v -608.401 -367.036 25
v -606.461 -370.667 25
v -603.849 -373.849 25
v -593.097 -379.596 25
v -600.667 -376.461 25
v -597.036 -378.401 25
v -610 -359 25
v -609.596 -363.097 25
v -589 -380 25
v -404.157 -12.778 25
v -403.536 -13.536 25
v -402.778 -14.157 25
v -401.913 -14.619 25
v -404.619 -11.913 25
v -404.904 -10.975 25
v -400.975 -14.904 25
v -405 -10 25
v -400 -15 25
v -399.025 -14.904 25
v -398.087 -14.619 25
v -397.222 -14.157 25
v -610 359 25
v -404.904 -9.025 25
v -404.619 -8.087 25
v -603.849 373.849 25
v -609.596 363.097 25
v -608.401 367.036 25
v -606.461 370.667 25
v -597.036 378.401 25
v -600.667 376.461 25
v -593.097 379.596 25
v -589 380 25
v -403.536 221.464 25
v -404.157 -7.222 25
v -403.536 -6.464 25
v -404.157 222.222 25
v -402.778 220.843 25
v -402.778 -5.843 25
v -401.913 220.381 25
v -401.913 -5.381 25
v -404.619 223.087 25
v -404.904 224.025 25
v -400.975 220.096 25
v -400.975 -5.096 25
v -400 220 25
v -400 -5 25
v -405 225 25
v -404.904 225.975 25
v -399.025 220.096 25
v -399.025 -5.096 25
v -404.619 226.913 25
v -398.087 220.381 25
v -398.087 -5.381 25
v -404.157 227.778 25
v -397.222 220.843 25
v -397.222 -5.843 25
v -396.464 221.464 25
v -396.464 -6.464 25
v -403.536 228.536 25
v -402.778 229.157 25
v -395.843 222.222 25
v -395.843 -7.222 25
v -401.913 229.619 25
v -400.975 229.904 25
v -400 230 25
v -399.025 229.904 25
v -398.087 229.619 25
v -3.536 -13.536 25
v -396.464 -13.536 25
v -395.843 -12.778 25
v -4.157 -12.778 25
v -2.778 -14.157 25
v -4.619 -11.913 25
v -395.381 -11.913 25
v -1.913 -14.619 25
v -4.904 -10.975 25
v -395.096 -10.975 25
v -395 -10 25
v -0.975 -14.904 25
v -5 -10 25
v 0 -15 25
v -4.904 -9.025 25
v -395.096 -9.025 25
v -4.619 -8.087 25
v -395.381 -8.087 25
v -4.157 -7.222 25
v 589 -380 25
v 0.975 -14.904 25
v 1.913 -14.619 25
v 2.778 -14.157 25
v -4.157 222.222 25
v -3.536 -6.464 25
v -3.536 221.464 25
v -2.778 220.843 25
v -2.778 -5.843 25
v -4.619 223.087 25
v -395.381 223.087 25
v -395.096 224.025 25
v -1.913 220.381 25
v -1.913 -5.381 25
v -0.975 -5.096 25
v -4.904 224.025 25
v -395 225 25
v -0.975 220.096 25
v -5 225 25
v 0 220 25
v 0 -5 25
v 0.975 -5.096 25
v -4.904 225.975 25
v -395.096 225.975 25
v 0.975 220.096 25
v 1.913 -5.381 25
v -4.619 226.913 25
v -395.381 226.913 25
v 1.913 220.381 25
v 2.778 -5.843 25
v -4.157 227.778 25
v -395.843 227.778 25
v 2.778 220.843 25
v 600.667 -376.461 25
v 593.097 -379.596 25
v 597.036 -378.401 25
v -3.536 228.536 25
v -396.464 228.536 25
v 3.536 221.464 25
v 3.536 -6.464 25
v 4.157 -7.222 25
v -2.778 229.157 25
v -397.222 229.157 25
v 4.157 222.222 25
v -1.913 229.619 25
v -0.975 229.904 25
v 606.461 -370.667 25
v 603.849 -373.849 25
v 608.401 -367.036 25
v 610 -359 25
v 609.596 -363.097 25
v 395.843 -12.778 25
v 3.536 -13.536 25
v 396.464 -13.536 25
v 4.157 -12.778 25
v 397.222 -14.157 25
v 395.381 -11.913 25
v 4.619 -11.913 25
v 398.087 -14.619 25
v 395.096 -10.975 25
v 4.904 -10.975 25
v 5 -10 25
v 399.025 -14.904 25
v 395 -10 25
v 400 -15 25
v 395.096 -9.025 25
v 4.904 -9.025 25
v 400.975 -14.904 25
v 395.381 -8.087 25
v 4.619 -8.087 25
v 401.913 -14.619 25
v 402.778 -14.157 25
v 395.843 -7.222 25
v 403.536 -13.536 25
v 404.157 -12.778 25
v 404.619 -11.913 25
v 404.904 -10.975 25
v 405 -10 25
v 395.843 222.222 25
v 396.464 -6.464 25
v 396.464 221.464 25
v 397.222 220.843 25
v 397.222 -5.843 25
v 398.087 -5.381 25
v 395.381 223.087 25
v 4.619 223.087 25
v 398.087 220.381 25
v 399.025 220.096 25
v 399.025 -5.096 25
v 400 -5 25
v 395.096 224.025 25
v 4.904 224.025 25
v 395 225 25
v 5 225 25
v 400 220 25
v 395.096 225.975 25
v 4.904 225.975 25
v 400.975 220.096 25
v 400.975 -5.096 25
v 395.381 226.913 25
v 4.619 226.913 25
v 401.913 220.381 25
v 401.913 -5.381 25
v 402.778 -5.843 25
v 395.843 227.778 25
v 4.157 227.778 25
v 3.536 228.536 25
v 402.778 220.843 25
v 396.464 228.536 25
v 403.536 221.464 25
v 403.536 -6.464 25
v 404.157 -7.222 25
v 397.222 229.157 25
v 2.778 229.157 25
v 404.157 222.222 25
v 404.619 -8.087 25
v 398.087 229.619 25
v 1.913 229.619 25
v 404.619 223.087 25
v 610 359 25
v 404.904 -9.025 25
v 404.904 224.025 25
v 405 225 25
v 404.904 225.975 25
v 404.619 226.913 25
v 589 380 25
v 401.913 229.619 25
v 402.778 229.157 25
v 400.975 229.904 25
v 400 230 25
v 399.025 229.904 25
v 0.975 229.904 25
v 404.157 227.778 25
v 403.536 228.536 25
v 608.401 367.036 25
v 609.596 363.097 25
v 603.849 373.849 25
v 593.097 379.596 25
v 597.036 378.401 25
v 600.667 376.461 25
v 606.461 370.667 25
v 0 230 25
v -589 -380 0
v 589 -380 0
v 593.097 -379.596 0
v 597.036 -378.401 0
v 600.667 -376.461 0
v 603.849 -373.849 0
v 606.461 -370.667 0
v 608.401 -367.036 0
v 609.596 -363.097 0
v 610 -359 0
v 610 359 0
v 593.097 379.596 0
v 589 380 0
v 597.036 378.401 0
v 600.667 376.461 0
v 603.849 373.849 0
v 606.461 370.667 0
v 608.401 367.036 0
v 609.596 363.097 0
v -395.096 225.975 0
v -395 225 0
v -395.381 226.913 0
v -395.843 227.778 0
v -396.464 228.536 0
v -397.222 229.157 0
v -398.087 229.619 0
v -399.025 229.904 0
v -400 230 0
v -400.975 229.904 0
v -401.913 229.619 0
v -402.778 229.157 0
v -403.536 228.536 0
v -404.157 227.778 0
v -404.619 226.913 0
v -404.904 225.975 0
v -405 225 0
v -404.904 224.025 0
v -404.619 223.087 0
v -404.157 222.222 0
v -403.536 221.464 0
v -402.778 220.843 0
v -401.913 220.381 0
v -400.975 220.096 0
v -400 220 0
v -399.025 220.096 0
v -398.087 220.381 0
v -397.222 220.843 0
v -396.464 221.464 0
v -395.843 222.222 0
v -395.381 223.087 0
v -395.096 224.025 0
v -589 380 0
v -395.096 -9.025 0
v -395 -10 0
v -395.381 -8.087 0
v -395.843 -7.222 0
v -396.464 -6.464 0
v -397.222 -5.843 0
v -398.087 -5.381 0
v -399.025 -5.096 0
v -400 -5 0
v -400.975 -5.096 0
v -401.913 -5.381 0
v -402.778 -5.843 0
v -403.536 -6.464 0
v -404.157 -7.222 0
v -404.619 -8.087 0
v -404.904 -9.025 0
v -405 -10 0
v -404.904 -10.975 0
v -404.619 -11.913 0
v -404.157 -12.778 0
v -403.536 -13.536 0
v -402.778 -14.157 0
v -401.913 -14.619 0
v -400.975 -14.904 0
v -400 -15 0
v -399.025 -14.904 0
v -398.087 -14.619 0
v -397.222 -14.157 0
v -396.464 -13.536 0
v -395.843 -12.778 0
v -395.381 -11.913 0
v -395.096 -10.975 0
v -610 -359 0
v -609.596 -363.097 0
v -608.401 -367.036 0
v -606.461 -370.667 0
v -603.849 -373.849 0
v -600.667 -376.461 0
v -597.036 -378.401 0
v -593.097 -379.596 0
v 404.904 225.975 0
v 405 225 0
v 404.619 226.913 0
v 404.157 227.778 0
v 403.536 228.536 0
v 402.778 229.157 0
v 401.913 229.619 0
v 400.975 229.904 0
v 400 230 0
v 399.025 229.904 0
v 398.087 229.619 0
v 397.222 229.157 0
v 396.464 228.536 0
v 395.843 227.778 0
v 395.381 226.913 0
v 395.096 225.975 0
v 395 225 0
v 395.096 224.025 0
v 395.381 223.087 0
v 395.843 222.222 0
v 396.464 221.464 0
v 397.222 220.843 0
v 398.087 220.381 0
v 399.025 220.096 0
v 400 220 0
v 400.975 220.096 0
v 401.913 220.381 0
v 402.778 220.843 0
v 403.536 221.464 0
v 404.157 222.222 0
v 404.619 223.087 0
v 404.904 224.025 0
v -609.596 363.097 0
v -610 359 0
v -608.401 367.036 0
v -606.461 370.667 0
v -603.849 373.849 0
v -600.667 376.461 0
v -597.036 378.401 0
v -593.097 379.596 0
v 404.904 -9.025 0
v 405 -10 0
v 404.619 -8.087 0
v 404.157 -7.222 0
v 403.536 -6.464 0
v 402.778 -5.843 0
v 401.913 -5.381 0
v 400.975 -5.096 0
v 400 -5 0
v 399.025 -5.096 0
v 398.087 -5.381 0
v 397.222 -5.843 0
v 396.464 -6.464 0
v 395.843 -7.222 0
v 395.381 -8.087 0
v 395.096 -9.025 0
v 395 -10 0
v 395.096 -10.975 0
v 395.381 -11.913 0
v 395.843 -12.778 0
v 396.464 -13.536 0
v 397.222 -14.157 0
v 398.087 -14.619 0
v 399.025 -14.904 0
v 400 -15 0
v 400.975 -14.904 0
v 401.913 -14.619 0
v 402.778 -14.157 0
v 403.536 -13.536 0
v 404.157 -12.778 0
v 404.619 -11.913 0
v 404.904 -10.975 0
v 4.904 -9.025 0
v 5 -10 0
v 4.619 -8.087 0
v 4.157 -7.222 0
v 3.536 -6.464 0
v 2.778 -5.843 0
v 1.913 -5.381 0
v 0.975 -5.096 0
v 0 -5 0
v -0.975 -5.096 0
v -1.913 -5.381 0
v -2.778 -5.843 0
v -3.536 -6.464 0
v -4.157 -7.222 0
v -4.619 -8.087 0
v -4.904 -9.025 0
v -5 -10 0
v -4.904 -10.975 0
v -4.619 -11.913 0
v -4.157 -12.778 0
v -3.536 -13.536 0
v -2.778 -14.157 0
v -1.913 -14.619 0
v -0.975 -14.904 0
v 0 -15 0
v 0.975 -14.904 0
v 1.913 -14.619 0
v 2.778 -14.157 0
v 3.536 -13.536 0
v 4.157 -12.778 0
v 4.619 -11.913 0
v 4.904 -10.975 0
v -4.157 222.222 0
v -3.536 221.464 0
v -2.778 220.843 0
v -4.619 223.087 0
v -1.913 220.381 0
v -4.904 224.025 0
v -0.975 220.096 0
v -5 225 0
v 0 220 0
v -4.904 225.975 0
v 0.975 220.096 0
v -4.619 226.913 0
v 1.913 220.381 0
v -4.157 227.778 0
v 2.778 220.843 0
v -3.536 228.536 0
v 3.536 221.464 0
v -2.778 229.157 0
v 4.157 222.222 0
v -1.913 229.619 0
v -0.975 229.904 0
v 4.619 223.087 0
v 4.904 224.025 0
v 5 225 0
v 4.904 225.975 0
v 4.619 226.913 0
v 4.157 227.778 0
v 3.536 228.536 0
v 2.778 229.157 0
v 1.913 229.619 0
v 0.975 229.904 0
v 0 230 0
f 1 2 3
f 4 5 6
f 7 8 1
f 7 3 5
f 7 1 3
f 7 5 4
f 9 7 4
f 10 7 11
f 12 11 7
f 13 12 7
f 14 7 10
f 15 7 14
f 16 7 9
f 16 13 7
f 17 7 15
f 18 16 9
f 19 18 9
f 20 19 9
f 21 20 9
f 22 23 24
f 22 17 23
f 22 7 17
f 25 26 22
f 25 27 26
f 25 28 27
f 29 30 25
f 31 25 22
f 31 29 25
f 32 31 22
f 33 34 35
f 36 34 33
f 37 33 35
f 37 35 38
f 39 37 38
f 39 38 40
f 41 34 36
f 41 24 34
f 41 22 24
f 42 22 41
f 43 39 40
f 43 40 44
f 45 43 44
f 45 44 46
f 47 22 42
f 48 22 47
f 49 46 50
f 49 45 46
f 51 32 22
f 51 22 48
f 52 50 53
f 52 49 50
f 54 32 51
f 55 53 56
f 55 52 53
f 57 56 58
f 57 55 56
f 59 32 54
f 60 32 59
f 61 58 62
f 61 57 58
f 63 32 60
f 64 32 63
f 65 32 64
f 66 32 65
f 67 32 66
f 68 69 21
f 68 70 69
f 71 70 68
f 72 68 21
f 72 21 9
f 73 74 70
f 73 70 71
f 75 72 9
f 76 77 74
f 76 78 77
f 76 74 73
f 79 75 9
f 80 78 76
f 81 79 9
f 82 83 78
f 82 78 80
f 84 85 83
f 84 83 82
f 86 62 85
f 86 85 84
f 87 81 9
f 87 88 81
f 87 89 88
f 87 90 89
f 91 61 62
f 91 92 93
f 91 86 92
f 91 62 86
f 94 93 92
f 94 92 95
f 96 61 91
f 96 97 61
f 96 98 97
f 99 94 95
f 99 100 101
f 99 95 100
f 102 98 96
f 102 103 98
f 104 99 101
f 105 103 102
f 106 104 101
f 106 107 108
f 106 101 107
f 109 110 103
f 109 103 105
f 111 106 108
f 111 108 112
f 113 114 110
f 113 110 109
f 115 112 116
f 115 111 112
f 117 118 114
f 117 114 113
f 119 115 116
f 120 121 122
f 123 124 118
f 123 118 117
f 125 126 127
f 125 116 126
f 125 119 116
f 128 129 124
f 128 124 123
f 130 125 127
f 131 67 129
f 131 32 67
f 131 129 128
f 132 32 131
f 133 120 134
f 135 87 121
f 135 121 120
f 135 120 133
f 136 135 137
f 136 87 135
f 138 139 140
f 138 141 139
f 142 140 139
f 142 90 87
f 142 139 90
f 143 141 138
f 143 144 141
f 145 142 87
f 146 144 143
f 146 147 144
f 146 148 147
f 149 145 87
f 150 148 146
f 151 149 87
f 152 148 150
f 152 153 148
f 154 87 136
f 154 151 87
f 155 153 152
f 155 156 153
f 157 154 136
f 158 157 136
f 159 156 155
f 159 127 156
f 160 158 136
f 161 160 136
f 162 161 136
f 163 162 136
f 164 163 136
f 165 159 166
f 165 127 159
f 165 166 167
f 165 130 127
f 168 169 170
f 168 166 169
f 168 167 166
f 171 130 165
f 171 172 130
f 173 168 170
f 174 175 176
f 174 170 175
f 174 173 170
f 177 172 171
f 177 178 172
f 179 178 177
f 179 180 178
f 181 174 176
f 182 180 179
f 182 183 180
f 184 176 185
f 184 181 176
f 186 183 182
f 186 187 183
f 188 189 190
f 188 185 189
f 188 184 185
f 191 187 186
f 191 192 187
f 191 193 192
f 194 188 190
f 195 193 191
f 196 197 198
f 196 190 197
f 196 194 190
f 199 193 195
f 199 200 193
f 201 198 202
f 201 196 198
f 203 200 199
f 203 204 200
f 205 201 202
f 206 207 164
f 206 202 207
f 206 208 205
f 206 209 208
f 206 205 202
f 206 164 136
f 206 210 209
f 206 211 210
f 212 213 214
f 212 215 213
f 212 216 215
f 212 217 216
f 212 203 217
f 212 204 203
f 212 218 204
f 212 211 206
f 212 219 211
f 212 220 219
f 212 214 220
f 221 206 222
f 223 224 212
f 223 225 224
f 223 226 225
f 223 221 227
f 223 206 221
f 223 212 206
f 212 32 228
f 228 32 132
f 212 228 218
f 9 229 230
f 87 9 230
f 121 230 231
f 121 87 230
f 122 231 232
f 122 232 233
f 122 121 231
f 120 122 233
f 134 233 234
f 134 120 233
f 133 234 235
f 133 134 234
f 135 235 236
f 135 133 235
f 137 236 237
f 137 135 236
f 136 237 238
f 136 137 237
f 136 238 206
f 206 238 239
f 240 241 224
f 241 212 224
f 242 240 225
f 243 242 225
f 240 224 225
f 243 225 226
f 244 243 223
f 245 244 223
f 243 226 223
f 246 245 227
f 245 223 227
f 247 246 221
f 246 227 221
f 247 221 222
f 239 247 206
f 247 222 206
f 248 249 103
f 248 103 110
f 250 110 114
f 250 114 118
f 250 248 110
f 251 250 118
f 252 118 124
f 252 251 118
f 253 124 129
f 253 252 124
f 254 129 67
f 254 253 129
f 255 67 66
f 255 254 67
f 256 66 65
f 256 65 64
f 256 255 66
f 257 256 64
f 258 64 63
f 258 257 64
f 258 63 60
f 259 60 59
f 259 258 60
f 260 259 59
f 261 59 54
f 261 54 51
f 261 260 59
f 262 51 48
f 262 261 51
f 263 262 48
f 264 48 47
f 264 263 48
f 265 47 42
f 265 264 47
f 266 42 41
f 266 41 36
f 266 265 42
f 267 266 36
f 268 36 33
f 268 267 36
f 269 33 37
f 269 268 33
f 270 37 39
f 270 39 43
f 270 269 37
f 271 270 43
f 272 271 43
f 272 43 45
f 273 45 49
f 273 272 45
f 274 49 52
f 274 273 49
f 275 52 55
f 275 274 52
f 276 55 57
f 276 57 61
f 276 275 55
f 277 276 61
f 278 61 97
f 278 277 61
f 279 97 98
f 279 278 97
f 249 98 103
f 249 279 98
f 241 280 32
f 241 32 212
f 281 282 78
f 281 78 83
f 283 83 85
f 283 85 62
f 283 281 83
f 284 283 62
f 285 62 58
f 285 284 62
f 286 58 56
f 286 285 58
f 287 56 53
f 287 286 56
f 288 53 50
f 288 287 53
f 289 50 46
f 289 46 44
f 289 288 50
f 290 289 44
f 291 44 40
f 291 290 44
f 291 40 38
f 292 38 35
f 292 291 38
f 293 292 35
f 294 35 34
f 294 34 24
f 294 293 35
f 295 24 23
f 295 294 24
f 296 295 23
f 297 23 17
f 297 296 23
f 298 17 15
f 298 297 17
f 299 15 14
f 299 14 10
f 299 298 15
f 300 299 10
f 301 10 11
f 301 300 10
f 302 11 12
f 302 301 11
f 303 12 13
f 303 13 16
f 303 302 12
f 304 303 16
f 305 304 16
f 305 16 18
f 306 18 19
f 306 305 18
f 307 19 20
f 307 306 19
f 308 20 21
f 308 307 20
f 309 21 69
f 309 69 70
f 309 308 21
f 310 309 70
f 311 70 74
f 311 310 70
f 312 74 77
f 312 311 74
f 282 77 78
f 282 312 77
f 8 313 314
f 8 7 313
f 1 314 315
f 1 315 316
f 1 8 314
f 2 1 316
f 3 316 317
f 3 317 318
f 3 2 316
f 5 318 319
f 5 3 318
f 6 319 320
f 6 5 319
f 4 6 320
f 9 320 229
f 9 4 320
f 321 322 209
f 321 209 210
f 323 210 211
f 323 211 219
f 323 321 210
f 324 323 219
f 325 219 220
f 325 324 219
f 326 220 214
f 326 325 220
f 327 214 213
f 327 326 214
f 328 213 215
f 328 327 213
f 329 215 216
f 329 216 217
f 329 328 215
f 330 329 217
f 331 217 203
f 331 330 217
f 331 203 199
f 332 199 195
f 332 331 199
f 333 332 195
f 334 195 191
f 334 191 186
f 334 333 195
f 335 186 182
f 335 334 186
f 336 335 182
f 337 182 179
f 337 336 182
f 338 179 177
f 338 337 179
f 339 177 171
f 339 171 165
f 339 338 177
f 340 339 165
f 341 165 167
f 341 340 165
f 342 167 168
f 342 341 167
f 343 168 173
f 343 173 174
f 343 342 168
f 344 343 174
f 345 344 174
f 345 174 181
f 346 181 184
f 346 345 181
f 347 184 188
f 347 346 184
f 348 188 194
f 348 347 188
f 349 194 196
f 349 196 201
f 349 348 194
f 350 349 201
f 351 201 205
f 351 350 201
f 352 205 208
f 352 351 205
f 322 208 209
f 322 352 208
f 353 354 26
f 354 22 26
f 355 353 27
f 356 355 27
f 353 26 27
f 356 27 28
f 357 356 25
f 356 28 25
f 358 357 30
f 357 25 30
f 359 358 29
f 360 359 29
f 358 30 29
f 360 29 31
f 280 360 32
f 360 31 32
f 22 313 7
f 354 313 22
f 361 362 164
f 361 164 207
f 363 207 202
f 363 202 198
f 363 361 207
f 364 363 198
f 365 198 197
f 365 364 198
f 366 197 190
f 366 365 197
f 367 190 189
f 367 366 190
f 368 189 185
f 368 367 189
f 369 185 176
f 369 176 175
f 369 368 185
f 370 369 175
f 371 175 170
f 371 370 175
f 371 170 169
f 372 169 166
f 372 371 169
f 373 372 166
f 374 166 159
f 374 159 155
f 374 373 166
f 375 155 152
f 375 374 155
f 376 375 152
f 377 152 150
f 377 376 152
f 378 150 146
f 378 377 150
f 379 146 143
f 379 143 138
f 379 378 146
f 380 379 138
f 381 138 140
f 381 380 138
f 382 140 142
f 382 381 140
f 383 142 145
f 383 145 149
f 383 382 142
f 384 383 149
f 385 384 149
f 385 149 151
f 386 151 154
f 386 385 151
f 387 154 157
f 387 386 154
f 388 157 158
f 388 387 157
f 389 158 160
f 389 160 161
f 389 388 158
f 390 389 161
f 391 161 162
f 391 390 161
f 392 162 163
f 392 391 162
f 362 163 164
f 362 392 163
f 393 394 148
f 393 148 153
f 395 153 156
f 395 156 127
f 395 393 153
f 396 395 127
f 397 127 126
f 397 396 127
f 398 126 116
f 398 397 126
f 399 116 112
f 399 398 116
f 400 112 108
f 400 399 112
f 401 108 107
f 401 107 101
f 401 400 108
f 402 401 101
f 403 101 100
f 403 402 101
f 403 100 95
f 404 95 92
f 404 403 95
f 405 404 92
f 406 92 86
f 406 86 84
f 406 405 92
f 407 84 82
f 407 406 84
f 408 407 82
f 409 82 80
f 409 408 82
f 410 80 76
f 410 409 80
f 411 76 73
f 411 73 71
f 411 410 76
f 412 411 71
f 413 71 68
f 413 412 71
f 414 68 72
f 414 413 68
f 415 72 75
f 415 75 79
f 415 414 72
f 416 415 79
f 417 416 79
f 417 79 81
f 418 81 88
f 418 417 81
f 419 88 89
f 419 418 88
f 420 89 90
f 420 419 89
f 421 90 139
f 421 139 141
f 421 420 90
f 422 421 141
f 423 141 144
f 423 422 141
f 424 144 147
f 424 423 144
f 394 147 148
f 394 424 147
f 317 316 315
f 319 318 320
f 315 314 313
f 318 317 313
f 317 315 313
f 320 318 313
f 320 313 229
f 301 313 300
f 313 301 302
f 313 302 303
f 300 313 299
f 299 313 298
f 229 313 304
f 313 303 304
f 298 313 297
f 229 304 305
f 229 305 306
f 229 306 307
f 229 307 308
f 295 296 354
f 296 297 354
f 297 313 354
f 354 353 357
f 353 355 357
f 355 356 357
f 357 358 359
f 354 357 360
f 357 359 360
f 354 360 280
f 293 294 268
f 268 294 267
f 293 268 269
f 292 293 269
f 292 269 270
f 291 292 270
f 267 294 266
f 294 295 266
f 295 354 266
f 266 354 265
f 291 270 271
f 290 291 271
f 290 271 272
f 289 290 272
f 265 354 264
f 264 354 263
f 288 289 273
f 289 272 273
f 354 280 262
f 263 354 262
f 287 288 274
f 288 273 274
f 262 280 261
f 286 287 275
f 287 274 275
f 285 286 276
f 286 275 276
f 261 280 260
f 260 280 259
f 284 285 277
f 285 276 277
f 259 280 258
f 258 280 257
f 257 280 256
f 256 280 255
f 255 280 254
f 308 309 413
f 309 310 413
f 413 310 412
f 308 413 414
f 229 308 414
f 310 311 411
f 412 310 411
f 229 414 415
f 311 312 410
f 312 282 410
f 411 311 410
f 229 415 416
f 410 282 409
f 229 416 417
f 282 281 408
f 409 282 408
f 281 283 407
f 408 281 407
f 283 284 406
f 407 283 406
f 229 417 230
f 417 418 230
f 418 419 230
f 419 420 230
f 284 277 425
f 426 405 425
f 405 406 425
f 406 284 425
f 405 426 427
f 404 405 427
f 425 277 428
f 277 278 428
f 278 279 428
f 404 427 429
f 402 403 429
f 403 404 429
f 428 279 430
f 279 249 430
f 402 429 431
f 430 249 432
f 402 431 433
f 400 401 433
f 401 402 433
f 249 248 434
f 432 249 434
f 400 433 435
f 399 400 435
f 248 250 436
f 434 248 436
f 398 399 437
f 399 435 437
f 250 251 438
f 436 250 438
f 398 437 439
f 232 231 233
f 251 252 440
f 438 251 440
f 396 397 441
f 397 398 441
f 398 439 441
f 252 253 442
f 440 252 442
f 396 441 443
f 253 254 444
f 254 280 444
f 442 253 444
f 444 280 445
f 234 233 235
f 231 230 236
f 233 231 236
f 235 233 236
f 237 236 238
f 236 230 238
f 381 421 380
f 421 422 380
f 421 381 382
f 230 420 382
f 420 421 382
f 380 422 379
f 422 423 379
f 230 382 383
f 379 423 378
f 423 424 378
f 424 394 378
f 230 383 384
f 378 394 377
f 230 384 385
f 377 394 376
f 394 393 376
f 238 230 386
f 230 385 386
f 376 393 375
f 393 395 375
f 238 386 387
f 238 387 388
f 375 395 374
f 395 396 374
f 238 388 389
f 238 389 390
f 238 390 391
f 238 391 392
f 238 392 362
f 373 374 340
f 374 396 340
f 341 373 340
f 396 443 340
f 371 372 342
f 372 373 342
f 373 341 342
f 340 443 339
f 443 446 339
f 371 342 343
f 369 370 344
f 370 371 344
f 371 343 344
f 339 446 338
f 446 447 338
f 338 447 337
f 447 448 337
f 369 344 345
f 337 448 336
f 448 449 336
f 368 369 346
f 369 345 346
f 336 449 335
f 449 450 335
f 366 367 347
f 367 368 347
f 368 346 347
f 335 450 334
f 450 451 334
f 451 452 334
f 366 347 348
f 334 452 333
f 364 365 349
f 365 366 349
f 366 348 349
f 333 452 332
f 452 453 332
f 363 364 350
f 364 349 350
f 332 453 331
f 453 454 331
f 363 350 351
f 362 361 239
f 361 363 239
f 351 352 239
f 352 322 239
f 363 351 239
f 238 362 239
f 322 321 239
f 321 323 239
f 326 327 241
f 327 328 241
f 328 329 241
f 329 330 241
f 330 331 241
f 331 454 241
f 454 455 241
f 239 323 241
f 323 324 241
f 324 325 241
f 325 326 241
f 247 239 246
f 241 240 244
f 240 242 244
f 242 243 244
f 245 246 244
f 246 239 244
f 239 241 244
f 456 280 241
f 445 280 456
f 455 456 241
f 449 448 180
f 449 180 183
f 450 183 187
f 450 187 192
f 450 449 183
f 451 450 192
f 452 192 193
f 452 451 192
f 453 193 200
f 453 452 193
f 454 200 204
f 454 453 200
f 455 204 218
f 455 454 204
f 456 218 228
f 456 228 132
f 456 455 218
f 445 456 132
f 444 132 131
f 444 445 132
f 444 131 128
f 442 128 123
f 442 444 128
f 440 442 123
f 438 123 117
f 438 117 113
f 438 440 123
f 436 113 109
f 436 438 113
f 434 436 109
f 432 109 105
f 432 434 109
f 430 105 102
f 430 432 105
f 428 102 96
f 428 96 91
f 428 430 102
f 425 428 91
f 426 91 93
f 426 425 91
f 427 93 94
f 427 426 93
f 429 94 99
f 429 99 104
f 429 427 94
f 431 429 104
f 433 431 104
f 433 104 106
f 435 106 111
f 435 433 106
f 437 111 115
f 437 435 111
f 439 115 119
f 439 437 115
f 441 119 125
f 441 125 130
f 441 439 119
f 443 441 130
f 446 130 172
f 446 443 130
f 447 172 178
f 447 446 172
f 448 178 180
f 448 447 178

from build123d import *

# Parameters (mm, degrees)
SKETCH_W  = 1220
SKETCH_H  = 760
SKETCH_R  = 5
PAD_DEPTH = 25
FILLET_R  = 21


with BuildPart() as part:
    # Sketch → Pad (new body)
    with BuildSketch(Plane.XY):
        Rectangle(SKETCH_W, SKETCH_H)
        with Locations((-400, 225)):
            Circle(SKETCH_R, mode=Mode.SUBTRACT)
        with Locations((-400, -10)):
            Circle(SKETCH_R, mode=Mode.SUBTRACT)
        with Locations((0, -10)):
            Circle(SKETCH_R, mode=Mode.SUBTRACT)
        with Locations((400, -10)):
            Circle(SKETCH_R, mode=Mode.SUBTRACT)
        with Locations((400, 225)):
            Circle(SKETCH_R, mode=Mode.SUBTRACT)
        with Locations((0, 225)):
            Circle(SKETCH_R, mode=Mode.SUBTRACT)
    extrude(amount=PAD_DEPTH)

    # Fillet
    fillet_edges = [part.edges().sort_by_distance(p)[0] for p in [
        (-610, -380, 12.5),
        (610, -380, 12.5),
        (610, 380, 12.5),
        (-610, 380, 12.5),
    ]]
    fillet(fillet_edges, radius=FILLET_R)


solid = part.part
